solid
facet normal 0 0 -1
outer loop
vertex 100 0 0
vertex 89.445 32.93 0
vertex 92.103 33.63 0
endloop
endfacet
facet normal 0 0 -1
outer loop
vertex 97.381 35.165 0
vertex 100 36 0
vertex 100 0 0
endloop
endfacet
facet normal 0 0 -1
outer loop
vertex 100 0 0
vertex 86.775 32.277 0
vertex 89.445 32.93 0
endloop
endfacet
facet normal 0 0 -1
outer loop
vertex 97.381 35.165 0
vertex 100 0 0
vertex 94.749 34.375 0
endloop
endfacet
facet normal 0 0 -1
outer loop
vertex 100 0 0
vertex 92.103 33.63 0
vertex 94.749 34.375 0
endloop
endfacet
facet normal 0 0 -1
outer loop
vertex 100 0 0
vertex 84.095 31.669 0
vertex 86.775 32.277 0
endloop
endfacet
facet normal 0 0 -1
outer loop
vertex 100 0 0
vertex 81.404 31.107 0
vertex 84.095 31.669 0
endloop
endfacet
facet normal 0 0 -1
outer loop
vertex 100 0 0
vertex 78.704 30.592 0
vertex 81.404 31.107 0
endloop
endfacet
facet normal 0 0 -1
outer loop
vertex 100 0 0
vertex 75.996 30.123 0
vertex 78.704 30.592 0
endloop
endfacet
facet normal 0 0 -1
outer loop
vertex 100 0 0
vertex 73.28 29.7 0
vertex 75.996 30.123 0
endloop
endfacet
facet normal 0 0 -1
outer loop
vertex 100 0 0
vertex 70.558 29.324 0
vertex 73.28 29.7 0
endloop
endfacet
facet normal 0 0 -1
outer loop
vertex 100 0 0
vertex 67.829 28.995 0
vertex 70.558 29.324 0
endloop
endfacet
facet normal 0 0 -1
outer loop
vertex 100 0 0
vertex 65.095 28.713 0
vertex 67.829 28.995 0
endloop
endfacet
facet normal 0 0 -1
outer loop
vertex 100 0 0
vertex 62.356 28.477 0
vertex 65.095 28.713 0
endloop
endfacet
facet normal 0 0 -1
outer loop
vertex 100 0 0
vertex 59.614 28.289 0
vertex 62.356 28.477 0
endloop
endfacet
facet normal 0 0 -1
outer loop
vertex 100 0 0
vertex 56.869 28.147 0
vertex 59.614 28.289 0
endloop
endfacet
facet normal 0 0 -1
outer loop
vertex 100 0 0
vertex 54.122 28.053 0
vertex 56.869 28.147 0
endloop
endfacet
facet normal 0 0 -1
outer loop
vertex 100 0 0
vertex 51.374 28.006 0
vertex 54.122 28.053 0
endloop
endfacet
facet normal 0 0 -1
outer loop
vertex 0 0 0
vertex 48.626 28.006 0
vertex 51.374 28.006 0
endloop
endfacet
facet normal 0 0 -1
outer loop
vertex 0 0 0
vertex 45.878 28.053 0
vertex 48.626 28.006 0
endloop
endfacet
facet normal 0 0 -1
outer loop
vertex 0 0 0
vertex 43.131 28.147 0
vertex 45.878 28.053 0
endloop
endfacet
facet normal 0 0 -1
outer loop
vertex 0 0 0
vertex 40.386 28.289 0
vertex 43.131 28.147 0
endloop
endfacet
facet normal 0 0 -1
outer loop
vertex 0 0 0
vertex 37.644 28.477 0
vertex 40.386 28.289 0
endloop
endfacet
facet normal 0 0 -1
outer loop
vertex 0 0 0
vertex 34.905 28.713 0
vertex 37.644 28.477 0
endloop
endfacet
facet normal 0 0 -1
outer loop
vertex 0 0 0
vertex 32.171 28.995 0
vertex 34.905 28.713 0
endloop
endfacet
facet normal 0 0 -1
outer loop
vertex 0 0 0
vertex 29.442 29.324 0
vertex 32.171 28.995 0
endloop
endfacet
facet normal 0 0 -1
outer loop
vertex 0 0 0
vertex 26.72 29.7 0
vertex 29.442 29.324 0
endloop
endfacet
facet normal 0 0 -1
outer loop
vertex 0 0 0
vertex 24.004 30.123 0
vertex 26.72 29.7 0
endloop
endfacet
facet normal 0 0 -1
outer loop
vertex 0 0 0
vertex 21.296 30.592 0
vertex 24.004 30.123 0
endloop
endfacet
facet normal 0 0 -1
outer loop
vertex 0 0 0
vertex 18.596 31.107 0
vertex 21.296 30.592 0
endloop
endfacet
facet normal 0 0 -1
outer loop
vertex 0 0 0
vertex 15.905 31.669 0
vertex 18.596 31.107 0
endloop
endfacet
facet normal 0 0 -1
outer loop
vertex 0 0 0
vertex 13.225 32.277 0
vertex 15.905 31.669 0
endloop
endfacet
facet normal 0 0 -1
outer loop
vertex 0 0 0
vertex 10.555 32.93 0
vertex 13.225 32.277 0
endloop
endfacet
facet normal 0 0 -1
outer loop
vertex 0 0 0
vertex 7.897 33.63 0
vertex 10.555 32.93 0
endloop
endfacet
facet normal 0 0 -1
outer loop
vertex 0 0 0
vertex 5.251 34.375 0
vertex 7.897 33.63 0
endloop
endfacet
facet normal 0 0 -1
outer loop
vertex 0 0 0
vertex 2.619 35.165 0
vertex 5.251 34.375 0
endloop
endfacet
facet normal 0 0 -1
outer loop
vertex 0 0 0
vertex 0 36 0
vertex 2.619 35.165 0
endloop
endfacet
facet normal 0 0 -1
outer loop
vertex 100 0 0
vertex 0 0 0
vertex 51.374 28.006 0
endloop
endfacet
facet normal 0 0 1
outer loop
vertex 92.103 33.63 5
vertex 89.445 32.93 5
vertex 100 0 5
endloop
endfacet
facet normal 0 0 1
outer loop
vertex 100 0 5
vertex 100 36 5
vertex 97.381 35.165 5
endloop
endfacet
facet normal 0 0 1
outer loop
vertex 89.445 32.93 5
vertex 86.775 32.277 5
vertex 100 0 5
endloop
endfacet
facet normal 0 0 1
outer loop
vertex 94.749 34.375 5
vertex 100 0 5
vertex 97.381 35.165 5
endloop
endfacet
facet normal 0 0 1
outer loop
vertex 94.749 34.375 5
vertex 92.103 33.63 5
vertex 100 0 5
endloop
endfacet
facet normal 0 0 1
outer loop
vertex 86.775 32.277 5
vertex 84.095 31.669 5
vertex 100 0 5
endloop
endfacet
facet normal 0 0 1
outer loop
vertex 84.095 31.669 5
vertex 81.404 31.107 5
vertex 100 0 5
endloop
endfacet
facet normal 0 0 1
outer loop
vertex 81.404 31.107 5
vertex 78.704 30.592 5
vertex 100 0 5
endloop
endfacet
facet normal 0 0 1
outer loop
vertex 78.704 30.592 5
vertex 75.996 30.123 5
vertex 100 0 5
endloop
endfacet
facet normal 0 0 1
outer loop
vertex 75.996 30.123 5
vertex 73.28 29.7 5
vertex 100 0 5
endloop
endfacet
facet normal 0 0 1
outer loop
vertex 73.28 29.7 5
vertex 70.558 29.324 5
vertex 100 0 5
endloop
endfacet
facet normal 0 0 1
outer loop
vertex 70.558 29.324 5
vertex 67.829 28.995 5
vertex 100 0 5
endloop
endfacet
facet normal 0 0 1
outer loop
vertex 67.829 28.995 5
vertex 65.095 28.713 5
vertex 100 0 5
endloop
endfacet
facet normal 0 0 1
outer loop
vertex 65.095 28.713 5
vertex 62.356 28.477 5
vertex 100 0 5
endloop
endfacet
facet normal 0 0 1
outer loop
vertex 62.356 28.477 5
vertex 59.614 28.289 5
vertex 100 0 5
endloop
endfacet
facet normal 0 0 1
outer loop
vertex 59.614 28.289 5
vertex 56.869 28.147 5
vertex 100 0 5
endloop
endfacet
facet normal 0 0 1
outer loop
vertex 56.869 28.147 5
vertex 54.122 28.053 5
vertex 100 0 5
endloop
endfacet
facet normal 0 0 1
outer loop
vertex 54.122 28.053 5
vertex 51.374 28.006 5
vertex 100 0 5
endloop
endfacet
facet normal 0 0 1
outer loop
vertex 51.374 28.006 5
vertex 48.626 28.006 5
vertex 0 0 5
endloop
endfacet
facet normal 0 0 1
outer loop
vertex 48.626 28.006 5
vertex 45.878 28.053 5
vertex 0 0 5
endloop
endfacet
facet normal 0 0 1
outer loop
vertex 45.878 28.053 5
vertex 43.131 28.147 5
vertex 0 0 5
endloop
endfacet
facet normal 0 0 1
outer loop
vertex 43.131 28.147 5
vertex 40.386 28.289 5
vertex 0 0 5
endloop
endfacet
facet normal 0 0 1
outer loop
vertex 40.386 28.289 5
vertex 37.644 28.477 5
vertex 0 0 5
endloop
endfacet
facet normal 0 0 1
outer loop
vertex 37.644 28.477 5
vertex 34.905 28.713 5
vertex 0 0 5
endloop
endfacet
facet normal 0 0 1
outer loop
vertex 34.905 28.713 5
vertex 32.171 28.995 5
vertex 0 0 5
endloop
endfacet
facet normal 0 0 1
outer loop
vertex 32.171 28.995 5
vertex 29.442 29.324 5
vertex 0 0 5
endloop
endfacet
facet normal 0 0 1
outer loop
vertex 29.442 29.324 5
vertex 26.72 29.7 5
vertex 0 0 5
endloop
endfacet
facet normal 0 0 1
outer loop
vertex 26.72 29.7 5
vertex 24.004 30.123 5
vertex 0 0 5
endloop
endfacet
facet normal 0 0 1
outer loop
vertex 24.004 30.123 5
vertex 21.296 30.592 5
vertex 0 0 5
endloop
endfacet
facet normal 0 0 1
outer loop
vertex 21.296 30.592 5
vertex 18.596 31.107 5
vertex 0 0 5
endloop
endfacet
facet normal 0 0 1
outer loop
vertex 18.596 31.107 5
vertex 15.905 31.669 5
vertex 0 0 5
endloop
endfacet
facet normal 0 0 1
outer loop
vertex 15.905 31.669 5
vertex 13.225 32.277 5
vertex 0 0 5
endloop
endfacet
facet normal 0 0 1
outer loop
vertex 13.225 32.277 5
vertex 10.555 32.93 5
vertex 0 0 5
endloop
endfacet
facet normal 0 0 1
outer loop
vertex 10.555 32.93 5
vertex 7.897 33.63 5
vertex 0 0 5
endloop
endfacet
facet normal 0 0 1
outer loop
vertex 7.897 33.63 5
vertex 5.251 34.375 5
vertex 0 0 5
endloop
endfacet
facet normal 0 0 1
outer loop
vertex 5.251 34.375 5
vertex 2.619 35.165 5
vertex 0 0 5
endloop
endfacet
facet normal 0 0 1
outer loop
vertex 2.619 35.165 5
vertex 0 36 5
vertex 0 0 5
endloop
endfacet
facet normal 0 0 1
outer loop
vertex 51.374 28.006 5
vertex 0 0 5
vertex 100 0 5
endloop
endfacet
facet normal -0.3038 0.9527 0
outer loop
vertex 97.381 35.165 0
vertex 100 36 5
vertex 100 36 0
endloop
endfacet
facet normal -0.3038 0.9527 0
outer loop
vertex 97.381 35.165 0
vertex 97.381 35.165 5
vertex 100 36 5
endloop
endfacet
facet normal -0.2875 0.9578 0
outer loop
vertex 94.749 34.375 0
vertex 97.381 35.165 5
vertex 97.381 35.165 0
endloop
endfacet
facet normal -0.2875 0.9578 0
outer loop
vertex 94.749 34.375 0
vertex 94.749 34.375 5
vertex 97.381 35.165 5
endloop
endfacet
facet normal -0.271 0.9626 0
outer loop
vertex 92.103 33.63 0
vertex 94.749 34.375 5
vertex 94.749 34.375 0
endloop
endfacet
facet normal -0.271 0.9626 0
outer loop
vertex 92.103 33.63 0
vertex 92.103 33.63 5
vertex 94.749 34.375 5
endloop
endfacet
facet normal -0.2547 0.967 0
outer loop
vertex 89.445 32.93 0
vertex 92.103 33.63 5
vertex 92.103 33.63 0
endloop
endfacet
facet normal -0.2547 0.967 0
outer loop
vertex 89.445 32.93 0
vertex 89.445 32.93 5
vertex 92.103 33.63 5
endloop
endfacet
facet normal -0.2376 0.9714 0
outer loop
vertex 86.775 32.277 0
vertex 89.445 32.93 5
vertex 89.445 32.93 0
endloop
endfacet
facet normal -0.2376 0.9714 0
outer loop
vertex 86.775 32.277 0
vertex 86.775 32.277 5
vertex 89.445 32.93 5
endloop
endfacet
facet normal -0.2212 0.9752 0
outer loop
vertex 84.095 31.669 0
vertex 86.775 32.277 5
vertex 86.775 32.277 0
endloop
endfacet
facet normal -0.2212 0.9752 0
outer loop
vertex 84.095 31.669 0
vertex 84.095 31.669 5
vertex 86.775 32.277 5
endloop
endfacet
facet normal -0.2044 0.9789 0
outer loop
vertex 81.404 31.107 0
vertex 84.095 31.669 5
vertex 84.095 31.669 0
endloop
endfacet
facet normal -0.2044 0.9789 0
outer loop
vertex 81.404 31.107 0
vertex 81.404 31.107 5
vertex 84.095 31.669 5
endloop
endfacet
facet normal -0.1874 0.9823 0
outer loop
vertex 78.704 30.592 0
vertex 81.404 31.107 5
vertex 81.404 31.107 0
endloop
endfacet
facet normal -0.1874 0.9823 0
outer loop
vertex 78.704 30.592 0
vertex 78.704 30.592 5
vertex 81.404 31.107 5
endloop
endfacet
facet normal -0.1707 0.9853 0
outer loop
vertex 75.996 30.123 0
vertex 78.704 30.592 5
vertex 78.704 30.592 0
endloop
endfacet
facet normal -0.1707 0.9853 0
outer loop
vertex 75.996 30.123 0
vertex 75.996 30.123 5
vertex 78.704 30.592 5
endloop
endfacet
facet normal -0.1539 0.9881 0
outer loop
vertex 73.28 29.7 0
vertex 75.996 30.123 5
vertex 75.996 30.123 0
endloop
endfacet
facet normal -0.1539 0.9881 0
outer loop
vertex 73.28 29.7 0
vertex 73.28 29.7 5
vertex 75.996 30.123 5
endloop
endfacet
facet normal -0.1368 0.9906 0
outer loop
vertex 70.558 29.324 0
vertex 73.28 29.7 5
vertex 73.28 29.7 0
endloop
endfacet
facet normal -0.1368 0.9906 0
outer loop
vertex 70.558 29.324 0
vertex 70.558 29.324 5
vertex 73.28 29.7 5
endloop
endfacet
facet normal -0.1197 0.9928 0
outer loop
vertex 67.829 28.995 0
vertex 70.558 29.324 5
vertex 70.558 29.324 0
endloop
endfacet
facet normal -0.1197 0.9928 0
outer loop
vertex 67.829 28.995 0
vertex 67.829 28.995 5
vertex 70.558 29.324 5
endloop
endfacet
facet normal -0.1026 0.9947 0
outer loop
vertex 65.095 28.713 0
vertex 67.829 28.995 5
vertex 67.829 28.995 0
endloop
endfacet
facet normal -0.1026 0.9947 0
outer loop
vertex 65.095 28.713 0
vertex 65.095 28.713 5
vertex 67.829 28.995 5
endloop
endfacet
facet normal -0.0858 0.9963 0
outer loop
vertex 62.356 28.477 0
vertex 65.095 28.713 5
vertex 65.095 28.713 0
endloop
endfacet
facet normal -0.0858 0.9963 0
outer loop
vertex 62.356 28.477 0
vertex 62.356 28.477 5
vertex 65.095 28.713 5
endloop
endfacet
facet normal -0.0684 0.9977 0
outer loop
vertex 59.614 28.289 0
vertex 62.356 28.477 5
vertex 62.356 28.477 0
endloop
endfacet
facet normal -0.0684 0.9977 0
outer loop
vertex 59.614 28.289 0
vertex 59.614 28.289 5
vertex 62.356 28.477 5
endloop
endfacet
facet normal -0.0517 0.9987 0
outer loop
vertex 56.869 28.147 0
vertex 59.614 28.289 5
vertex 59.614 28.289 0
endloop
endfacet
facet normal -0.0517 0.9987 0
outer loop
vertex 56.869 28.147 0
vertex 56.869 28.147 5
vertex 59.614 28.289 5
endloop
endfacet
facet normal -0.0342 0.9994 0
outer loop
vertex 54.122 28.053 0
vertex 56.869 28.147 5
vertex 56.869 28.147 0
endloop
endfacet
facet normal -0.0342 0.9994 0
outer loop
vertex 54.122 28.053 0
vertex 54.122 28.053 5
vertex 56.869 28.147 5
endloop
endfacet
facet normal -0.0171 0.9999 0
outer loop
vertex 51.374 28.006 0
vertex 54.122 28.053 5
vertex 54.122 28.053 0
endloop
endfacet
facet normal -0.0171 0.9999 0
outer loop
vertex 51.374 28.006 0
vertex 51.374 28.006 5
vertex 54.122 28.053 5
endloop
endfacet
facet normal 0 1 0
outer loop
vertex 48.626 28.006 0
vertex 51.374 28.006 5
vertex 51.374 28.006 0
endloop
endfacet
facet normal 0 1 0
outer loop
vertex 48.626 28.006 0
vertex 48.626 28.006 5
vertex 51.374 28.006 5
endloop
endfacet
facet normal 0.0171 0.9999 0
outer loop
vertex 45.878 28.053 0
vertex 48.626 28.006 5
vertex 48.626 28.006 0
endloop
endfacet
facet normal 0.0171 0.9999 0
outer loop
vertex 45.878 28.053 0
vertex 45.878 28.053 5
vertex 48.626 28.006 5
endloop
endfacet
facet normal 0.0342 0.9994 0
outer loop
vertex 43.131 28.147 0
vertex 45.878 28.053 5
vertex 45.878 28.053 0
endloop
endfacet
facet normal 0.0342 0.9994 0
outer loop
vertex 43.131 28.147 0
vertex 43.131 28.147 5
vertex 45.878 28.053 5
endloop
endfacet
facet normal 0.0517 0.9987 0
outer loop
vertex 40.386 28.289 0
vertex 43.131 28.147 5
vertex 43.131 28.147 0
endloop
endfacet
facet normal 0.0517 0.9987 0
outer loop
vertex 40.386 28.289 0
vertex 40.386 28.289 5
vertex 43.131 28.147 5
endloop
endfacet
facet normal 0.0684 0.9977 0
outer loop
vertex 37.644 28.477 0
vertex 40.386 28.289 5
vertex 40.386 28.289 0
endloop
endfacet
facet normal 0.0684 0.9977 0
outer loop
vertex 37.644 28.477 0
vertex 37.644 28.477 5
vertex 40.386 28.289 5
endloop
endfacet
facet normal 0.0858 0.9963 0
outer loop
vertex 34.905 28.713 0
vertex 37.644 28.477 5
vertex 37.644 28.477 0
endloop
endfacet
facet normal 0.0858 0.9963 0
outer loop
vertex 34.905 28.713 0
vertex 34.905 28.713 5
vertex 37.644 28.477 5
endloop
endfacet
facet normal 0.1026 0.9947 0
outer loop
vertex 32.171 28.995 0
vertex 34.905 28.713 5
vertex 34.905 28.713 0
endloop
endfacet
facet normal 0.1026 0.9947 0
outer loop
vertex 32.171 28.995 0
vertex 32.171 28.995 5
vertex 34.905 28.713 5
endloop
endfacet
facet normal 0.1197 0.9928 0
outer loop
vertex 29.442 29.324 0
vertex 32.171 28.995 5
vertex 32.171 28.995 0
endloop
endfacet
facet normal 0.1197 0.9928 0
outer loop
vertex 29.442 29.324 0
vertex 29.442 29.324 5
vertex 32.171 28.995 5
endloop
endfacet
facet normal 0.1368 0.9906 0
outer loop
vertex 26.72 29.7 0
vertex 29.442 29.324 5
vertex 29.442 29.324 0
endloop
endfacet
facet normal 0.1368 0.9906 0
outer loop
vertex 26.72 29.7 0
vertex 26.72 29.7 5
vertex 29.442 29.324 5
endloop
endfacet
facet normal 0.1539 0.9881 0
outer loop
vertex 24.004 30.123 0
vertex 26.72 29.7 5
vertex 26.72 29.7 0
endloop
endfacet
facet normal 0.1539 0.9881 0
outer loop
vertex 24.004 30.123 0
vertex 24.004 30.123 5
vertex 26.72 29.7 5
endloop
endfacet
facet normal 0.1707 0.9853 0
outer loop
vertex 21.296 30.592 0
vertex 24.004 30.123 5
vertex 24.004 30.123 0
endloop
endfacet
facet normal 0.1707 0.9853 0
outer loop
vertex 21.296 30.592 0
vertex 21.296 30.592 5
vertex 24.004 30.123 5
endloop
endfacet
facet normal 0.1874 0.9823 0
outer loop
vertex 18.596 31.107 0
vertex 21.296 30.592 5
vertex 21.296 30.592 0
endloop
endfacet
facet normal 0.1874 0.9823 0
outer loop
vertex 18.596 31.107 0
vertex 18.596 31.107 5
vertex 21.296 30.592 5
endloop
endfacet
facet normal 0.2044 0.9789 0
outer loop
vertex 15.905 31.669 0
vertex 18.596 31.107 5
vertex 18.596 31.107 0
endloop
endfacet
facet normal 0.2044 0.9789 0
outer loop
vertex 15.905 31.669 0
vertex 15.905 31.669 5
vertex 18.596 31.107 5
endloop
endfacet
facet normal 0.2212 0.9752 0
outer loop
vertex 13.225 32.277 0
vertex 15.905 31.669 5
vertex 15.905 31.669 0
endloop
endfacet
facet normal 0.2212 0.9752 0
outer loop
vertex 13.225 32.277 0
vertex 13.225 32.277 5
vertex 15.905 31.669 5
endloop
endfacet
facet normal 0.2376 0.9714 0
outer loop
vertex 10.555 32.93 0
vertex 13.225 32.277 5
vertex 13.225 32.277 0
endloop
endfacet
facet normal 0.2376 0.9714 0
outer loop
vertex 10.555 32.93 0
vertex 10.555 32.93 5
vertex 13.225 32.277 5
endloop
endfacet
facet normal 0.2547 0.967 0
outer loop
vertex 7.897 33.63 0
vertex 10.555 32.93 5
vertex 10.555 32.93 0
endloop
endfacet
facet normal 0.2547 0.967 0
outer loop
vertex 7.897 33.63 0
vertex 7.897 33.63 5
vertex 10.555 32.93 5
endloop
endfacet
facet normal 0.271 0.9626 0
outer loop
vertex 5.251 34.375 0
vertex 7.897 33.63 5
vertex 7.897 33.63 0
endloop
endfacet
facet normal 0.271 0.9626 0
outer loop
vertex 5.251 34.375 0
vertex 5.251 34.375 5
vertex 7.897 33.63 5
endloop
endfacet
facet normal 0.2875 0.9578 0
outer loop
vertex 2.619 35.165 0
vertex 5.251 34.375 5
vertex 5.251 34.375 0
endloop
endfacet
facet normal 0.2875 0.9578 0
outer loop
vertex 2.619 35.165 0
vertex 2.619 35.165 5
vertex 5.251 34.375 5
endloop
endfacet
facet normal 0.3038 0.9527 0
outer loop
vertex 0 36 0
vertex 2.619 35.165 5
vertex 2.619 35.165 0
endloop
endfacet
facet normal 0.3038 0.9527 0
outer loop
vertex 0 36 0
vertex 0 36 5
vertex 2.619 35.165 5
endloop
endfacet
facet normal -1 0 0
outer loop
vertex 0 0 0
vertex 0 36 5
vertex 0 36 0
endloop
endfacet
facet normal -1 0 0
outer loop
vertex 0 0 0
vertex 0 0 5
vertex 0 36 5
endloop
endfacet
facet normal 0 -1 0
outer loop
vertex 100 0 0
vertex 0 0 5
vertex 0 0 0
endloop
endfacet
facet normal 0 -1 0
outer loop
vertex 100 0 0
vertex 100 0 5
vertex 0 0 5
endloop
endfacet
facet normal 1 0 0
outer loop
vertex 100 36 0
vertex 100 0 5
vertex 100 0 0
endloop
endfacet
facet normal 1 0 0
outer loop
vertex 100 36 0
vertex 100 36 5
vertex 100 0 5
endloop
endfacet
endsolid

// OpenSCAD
$fn = 32;

// ----------------------------------------------------------------------
// Arc profile plate: notch, 40 points
// ----------------------------------------------------------------------

// --- parameters (mm) ---
bar_l = 100;              // bar length, X
bar_w = 36;               // bar width, Y
notch_depth = 8;          // depth of the arc notch at mid-span
arc_r = 160.25;           // radius of the notch arc
arc_angle = 36.36;        // notch arc angle, degrees
arc_step = 1;             // sampling step of the notch arc, degrees
plate_t = 5;              // plate thickness, Z

profile = [[0, 0], [100, 0], [100, 36], [97.381, 35.165], [94.749, 34.375], [92.103, 33.63], [89.445, 32.93], [86.775, 32.277], [84.095, 31.669], [81.404, 31.107], [78.704, 30.592], [75.996, 30.123], [73.28, 29.7], [70.558, 29.324], [67.829, 28.995], [65.095, 28.713], [62.356, 28.477], [59.614, 28.289], [56.869, 28.147], [54.122, 28.053], [51.374, 28.006], [48.626, 28.006], [45.878, 28.053], [43.131, 28.147], [40.386, 28.289], [37.644, 28.477], [34.905, 28.713], [32.171, 28.995], [29.442, 29.324], [26.72, 29.7], [24.004, 30.123], [21.296, 30.592], [18.596, 31.107], [15.905, 31.669], [13.225, 32.277], [10.555, 32.93], [7.897, 33.63], [5.251, 34.375], [2.619, 35.165], [0, 36]];  // primary outline, 40 points, counter clockwise

// --- the one profile operation ---
linear_extrude(height = plate_t) polygon(points = profile);
